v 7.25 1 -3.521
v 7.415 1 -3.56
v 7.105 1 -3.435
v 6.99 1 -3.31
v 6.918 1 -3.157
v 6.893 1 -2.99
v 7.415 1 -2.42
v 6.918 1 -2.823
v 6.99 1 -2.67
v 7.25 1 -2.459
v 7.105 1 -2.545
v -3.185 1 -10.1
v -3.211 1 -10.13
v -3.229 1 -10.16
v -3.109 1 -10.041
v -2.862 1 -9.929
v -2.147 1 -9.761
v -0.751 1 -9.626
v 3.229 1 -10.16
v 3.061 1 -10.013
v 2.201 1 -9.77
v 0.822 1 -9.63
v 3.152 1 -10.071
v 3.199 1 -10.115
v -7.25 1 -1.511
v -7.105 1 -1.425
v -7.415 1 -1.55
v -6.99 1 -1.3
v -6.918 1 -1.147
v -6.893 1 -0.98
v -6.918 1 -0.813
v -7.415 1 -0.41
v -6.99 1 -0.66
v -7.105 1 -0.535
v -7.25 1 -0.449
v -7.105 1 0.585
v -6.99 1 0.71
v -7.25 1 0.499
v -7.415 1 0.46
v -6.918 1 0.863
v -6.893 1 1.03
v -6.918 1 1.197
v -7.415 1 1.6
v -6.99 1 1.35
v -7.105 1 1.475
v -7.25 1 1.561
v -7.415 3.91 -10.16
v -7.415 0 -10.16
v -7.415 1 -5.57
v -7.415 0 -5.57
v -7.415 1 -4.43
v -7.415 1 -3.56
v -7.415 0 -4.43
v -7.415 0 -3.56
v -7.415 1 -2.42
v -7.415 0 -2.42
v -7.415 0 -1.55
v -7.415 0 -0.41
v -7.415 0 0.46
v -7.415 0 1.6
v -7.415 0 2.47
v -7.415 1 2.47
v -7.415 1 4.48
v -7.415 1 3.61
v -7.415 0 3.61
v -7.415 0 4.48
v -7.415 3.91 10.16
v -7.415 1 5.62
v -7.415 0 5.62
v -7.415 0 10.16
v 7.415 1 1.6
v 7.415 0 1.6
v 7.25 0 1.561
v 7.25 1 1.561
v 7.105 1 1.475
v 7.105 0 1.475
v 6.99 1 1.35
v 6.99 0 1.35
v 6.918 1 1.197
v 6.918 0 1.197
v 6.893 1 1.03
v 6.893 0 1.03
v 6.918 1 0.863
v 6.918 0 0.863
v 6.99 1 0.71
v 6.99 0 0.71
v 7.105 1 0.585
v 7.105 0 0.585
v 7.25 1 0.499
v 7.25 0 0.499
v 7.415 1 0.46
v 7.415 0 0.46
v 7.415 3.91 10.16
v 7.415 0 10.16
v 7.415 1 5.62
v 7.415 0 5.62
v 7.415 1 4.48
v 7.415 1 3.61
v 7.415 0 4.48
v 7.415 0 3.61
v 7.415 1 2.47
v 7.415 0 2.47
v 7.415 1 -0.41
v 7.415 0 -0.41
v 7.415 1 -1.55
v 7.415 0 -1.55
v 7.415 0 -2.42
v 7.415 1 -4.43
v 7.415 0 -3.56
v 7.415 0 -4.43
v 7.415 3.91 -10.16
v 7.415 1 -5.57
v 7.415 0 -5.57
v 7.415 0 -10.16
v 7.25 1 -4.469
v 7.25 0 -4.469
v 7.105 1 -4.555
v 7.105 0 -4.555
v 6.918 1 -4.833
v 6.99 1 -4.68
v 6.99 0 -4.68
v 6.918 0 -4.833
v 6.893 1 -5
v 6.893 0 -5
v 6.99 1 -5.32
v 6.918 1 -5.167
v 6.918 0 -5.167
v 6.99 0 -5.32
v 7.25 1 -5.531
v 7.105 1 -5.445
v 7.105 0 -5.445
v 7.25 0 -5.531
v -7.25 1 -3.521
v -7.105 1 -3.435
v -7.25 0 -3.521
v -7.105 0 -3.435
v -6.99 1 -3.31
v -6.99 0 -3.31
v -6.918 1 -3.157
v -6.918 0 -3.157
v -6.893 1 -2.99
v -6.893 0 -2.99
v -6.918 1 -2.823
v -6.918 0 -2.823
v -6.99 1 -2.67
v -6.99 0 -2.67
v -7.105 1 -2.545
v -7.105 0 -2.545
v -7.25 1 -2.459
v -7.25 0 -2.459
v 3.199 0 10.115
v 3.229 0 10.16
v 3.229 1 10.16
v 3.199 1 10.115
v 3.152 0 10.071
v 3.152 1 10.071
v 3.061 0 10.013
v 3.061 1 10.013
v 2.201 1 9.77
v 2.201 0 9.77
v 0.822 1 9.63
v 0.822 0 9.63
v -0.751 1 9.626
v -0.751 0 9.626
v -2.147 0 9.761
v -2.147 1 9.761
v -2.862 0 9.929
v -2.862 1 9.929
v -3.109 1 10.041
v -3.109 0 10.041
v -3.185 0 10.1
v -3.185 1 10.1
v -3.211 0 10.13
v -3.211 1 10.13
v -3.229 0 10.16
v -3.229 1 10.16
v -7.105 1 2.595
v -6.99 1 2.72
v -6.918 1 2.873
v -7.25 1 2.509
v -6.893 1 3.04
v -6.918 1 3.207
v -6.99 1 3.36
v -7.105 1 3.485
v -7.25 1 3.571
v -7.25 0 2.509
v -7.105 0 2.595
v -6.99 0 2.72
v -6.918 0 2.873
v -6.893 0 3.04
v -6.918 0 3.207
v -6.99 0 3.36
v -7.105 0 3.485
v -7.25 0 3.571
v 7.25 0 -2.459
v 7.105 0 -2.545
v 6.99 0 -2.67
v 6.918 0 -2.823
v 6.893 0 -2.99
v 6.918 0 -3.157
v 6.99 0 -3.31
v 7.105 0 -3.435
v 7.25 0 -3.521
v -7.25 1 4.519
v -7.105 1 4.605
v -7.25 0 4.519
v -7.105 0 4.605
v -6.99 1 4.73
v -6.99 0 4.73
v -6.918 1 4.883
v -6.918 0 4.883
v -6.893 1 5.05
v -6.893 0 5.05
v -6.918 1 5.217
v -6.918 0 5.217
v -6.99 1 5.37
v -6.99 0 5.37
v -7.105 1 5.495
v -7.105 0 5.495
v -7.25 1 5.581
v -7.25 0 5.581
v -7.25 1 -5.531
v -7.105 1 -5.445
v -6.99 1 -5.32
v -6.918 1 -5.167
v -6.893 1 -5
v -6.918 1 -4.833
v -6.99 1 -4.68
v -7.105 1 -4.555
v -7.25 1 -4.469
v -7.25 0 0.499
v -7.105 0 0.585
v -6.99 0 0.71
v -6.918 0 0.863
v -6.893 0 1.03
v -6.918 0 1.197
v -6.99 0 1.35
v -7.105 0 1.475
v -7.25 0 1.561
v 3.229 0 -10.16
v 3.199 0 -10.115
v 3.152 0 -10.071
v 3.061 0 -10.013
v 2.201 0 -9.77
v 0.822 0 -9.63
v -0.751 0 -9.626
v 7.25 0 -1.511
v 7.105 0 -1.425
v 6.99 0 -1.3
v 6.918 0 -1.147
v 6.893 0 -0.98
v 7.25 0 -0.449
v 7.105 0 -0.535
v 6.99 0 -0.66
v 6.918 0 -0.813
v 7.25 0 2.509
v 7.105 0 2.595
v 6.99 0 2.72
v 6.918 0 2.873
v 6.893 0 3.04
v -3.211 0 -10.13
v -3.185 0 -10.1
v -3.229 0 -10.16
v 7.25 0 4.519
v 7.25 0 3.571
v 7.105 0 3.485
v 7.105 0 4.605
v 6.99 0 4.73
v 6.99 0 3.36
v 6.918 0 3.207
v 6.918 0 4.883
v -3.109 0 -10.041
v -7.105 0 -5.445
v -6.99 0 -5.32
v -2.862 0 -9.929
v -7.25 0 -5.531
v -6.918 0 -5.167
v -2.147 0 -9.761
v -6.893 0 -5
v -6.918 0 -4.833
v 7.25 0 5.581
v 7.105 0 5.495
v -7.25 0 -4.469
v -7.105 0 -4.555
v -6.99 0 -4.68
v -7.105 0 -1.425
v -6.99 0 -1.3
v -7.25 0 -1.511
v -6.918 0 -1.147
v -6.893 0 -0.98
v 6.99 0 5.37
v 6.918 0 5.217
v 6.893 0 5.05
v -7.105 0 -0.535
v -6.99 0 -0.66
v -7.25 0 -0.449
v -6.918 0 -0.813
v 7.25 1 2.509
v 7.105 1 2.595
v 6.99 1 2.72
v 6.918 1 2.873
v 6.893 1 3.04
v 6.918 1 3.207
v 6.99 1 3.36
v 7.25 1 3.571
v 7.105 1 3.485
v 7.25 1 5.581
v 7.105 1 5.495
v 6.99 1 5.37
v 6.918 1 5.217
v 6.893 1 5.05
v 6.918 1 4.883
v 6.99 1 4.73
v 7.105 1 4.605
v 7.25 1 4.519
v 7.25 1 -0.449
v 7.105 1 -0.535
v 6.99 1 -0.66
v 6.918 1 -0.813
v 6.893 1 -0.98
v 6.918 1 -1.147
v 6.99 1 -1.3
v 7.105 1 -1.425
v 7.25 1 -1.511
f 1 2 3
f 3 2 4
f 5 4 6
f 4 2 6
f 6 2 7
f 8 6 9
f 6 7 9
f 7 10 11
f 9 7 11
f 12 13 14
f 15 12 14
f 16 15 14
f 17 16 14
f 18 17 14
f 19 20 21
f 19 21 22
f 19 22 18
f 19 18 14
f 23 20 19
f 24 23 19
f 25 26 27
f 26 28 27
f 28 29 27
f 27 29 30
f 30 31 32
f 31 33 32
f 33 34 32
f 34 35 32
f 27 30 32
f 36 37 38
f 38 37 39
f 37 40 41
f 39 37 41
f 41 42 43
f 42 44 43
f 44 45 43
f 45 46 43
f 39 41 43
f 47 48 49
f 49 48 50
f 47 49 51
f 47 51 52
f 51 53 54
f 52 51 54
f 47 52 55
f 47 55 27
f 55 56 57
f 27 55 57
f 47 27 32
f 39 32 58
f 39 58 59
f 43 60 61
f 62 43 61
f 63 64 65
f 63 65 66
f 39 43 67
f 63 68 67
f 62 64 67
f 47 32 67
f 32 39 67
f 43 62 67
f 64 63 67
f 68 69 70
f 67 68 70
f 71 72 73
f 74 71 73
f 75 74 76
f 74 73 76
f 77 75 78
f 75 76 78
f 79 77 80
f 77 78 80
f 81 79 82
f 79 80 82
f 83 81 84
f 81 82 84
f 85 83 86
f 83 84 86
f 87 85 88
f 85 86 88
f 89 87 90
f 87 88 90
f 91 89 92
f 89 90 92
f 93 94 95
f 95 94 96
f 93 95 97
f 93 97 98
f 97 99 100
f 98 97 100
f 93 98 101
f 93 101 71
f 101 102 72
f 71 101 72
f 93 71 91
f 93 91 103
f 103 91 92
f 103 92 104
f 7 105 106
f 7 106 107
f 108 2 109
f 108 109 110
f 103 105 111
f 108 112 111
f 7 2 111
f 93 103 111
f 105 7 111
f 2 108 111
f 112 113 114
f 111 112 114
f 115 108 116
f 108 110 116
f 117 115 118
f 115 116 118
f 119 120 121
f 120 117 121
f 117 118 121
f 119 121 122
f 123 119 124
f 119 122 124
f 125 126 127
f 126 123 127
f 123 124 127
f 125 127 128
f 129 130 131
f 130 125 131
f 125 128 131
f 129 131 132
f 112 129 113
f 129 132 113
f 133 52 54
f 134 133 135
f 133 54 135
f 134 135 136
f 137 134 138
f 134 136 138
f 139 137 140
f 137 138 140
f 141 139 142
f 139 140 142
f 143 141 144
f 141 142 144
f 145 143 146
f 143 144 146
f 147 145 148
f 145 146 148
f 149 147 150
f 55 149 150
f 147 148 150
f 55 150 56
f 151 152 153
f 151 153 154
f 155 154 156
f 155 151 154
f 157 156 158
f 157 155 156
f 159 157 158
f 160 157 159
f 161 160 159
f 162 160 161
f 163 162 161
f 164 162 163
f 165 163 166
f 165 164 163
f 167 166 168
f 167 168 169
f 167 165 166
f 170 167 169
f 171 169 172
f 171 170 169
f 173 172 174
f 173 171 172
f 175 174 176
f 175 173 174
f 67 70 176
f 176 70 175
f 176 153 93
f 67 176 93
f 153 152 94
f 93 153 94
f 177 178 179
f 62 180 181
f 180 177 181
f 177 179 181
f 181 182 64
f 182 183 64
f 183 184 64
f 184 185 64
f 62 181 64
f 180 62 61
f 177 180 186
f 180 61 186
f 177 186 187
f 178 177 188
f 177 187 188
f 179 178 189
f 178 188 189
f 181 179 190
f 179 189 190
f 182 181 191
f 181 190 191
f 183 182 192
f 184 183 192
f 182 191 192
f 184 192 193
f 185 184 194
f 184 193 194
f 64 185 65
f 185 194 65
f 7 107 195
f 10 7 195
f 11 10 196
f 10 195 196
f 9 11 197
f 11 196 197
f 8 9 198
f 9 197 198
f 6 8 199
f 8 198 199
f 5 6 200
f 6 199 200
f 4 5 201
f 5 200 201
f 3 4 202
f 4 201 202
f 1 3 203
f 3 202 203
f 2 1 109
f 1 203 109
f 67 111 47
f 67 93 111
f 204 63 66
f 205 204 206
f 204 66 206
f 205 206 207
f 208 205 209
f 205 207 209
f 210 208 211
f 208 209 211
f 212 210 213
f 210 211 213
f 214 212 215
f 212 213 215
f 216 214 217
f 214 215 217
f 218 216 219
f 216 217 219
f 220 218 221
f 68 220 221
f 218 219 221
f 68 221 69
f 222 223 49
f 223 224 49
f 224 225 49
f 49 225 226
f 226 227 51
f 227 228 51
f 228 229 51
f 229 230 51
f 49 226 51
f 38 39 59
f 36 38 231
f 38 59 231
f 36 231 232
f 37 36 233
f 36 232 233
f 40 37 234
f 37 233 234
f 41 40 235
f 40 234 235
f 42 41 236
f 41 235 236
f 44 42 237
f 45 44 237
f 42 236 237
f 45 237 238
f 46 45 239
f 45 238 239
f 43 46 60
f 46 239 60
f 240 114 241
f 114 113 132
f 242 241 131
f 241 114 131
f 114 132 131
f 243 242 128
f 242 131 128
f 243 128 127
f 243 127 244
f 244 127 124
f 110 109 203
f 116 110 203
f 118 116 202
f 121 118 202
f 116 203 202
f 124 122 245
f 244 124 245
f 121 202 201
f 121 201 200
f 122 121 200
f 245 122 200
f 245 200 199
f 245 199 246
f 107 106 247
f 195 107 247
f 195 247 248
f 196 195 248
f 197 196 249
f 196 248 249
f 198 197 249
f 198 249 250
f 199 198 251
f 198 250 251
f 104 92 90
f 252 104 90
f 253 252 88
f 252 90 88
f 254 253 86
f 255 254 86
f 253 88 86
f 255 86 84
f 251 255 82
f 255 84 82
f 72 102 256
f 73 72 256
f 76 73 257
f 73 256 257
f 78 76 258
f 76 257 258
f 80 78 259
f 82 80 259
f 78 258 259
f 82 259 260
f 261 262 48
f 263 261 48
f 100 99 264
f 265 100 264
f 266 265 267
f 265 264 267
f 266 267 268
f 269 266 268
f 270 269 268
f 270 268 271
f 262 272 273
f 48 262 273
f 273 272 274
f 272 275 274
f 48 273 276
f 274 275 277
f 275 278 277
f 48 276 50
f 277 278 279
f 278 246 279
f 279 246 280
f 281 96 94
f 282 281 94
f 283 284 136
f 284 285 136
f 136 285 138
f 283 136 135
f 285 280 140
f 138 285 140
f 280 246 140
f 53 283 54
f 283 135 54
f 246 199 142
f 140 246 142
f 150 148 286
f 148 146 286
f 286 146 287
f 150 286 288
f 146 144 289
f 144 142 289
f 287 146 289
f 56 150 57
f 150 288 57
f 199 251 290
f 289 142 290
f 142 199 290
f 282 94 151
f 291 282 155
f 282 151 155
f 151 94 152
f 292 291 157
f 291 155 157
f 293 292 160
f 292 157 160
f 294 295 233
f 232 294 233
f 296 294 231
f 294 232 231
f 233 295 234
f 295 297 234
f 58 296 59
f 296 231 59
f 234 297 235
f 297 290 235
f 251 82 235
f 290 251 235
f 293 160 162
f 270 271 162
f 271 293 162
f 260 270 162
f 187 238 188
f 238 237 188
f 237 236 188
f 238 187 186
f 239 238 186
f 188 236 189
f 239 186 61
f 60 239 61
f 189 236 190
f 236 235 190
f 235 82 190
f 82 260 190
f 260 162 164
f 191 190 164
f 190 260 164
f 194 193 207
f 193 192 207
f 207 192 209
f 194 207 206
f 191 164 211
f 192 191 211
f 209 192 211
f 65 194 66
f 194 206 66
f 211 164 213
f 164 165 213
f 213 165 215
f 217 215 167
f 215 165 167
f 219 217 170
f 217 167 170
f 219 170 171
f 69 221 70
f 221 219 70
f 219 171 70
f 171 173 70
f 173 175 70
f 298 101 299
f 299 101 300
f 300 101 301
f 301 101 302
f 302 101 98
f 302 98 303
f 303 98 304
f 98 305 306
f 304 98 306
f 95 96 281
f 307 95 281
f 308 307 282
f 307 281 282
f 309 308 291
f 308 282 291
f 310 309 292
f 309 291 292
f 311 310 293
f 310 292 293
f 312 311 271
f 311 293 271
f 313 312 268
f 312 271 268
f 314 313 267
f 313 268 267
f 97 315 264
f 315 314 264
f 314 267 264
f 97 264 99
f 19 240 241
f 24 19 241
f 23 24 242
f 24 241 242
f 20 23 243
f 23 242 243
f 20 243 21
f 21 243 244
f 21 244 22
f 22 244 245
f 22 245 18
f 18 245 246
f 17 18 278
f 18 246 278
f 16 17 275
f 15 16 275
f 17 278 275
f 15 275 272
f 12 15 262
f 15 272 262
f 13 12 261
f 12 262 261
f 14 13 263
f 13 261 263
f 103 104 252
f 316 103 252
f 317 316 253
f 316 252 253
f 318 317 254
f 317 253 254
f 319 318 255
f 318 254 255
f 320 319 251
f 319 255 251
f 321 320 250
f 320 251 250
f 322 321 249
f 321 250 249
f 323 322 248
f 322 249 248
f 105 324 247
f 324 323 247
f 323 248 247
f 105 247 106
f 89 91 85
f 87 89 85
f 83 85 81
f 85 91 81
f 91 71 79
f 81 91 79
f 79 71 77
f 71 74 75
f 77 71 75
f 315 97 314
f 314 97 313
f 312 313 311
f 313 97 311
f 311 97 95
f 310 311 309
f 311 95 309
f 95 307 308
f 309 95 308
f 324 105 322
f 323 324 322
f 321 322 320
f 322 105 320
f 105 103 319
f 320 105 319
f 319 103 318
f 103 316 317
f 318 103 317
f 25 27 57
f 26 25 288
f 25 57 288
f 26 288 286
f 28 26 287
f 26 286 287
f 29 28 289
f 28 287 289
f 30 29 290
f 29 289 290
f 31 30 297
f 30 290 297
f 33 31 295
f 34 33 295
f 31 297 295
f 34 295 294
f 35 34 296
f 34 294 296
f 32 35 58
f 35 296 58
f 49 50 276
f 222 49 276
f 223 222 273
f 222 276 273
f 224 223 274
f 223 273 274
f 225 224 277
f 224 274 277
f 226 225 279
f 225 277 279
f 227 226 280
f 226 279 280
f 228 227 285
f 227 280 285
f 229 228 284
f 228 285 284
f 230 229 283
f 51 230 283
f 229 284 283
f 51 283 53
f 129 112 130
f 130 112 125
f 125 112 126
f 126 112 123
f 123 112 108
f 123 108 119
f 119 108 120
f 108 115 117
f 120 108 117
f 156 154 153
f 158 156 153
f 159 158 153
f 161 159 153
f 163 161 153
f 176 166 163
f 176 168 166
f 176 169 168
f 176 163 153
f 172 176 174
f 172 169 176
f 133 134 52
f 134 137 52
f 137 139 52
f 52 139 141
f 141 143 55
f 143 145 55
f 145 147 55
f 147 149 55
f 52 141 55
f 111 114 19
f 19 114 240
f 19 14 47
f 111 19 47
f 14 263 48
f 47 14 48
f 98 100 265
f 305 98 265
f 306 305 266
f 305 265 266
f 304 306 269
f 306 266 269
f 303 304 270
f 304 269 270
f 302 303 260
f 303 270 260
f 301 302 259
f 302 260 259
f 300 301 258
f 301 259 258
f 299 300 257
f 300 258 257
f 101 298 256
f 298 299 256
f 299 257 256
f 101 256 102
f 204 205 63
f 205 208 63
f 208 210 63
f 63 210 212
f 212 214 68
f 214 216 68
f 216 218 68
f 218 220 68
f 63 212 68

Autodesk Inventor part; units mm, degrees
ref_plane "YZ Plane" through (0, 0, 0) normal (1, 0, 0) x (0, 1, 0)
ref_plane "XZ Plane" through (0, 0, 0) normal (0, 1, 0) x (-1, 0, 0)
ref_plane "XY Plane" through (0, 0, 0) normal (0, 0, 1) x (1, 0, 0)
sketch "Sketch1" plane through (0, 0, 0) normal (0, 1, 0) x (-1, 0, 0)
  line L0 (7.415, 10.16) -> (-7.415, 10.16)
  line L1 (-7.415, 10.16) -> (-7.415, -10.16)
  line L2 (-7.415, -10.16) -> (7.415, -10.16)
  line L3 (7.415, -10.16) -> (7.415, 10.16)
  point P0 (0, 0)
  dimension "d0" = 20.32
  dimension "d1" = 10.16
  dimension "d2" = 14.83
  dimension "d3" = 7.415
extrude "Extrusion1" add sketch "Sketch1" along normal blind 3.91
sketch "Sketch2" plane through (0, 0, 0) normal (0, 1, 0) x (-1, 0, 0)
  line L0 (6.465, -5.76) -> (7.465, -5.76)
  line L1 (7.465, -5.76) -> (7.465, -4.24)
  line L2 (7.465, -4.24) -> (6.465, -4.24)
  line L3 (6.465, -4.24) -> (6.465, -5.76)
  line L4 (7.415, -10.16) -> (7.415, 10.16) projected
  line L5 (-7.415, -10.16) -> (7.415, -10.16) projected
  circle A0 centre (7.465, -5) radius 0.5724
  point P0 (0, 0)
  dimension "d6" = 1
  dimension "d7" = 1.52
  dimension "d8" = 0.05
  dimension "d9" = 4.4
extrude "Extrusion2" cut sketch "Sketch2" along normal blind 1 contours A0 L4 | L4 A0 L1 | L1 A0
pattern_linear "Rectangular Pattern1" count 6 spacing 2.01 along (0, 0, 1) of "Extrusion2"
mirror "Mirror1" about plane through (0, 0, 0) normal (1, 0, 0) of "Extrusion2", "Rectangular Pattern1"
sketch "Sketch3" plane through (0, 0, 0) normal (0, -1, 0) x (1, 0, 0)
  line L0 (3.695, -10.21) -> (-3.695, -10.21)
  line L1 (-3.695, -10.21) -> (-3.695, -9.21)
  line L2 (-3.695, -9.21) -> (3.695, -9.21)
  line L3 (3.695, -9.21) -> (3.695, -10.21)
  line L4 (7.415, -10.16) -> (-7.415, -10.16) projected
  ellipse E0 centre (0, -10.21) end of major axis (-3.2399, -10.21) minor radius 0.6001
  point P0 (0, 0)
  dimension "d15" = 0.05
  dimension "d16" = 7.39
  dimension "d17" = 3.695
  dimension "d18" = 1
extrude "Extrusion3" cut sketch "Sketch3" against normal blind 1 contours E0 L4 L0 | L0 E0 | E0 L4
mirror "Mirror2" about plane through (0, 0, 0) normal (0, 0, 1) of "Extrusion3"
properties part number "MC_DK1042"
